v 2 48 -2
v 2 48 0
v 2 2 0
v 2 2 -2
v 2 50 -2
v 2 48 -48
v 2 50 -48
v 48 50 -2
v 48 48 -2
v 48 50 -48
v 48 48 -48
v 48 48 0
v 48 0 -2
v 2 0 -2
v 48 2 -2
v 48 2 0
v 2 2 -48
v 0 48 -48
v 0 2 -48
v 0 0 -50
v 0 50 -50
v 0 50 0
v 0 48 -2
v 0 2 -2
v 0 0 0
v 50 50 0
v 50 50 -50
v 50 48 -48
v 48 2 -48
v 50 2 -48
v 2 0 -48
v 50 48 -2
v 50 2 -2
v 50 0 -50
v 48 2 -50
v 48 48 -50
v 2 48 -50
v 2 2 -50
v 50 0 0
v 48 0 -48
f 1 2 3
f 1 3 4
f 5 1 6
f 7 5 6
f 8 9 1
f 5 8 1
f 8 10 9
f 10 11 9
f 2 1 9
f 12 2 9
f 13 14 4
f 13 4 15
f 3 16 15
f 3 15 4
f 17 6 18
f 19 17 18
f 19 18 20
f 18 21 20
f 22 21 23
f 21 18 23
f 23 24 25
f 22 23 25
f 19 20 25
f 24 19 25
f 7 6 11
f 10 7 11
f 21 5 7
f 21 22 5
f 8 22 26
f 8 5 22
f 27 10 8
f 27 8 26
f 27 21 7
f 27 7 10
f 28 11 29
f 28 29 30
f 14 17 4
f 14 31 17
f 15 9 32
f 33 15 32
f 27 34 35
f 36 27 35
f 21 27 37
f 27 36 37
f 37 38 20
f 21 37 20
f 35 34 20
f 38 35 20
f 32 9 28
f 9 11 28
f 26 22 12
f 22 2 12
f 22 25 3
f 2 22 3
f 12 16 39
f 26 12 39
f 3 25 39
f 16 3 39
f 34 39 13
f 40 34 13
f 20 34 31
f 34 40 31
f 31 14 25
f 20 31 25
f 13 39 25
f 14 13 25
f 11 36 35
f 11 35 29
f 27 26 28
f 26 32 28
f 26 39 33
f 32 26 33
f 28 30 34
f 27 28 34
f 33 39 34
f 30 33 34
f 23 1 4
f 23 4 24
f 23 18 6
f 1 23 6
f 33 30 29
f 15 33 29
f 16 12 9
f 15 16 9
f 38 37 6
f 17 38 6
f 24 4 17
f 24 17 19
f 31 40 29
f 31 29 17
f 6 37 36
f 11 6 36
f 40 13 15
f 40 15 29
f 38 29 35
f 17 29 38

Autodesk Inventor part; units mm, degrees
ref_plane "YZ Plane" through (0, 0, 0) normal (1, 0, 0) x (0, 1, 0)
ref_plane "XZ Plane" through (0, 0, 0) normal (0, 1, 0) x (-1, 0, 0)
ref_plane "XY Plane" through (0, 0, 0) normal (0, 0, 1) x (1, 0, 0)
sketch "Szkic1" plane through (0, 0, 0) normal (0, 1, 0) x (-1, 0, 0)
  line L0 (0, 0) -> (-50, 0)
  line L1 (-50, 0) -> (-50, -50)
  line L2 (-50, -50) -> (0, -50)
  line L3 (0, -50) -> (0, 0)
  line L4 (-2, -2) -> (-48, -2)
  line L5 (-48, -2) -> (-48, -48)
  line L6 (-48, -48) -> (-2, -48)
  line L7 (-2, -48) -> (-2, -2)
  dimension "d0" = 50
  dimension "d1" = 50
  dimension "d2" = 2
extrude "Wyciągnięcie proste1" add sketch "Szkic1" along normal blind 2
sketch "Szkic2" plane through (0, 2, 0) normal (0, 1, 0) x (1, 0, 0)
  line L0 (50, 0) -> (50, 50) projected
  line L1 (50, 50) -> (0, 50) projected
  line L2 (0, 50) -> (0, 0) projected
  line L3 (0, 0) -> (50, 0) projected
  line L4 (2, 2) -> (2, 48) projected
  line L5 (2, 48) -> (48, 48) projected
  line L6 (48, 48) -> (48, 2) projected
  line L7 (48, 2) -> (2, 2) projected
  line L8 (0, 50) -> (0, 0) projected
  line L9 (0, 0) -> (2, 0)
  line L10 (2, 0) -> (2, 2)
  line L11 (2, 2) -> (0, 2)
  line L12 (0, 2) -> (0, 0)
  line L13 (2, 48) -> (0, 48)
  line L14 (0, 48) -> (0, 50)
  line L15 (0, 50) -> (2, 50)
  line L16 (2, 50) -> (2, 48)
  line L17 (0, 0) -> (50, 0) projected
  line L18 (50, 0) -> (48, 0)
  line L19 (48, 0) -> (48, 2)
  line L20 (48, 2) -> (50, 2)
  line L21 (50, 2) -> (50, 0)
  line L22 (2, 48) -> (48, 48) projected
  line L23 (48, 48) -> (50, 48)
  line L24 (50, 48) -> (50, 50)
  line L25 (50, 50) -> (48, 50)
  line L26 (48, 50) -> (48, 48)
extrude "Wyciągnięcie proste2" add sketch "Szkic2" along normal blind 46 contours L3 L19 L20 L0 | L23 L26 L1 L0 | L3 L2 L11 L10 | L13 L2 L1 L16
sketch "Szkic3" plane through (0, 48, 0) normal (0, 1, 0) x (1, 0, 0)
  line L0 (48, 50) -> (2, 50) projected
  line L1 (50, 0) -> (50, 50) projected
  line L2 (0, 0) -> (50, 0) projected
  line L3 (0, 50) -> (0, 0) projected
  line L4 (50, 50) -> (0, 50) projected
  line L5 (2, 2) -> (2, 48) projected
  line L6 (48, 2) -> (2, 2) projected
  line L7 (48, 48) -> (48, 2) projected
  line L8 (2, 48) -> (48, 48) projected
extrude "Wyciągnięcie proste3" add sketch "Szkic3" along normal blind 2
properties part number "wymiar"
